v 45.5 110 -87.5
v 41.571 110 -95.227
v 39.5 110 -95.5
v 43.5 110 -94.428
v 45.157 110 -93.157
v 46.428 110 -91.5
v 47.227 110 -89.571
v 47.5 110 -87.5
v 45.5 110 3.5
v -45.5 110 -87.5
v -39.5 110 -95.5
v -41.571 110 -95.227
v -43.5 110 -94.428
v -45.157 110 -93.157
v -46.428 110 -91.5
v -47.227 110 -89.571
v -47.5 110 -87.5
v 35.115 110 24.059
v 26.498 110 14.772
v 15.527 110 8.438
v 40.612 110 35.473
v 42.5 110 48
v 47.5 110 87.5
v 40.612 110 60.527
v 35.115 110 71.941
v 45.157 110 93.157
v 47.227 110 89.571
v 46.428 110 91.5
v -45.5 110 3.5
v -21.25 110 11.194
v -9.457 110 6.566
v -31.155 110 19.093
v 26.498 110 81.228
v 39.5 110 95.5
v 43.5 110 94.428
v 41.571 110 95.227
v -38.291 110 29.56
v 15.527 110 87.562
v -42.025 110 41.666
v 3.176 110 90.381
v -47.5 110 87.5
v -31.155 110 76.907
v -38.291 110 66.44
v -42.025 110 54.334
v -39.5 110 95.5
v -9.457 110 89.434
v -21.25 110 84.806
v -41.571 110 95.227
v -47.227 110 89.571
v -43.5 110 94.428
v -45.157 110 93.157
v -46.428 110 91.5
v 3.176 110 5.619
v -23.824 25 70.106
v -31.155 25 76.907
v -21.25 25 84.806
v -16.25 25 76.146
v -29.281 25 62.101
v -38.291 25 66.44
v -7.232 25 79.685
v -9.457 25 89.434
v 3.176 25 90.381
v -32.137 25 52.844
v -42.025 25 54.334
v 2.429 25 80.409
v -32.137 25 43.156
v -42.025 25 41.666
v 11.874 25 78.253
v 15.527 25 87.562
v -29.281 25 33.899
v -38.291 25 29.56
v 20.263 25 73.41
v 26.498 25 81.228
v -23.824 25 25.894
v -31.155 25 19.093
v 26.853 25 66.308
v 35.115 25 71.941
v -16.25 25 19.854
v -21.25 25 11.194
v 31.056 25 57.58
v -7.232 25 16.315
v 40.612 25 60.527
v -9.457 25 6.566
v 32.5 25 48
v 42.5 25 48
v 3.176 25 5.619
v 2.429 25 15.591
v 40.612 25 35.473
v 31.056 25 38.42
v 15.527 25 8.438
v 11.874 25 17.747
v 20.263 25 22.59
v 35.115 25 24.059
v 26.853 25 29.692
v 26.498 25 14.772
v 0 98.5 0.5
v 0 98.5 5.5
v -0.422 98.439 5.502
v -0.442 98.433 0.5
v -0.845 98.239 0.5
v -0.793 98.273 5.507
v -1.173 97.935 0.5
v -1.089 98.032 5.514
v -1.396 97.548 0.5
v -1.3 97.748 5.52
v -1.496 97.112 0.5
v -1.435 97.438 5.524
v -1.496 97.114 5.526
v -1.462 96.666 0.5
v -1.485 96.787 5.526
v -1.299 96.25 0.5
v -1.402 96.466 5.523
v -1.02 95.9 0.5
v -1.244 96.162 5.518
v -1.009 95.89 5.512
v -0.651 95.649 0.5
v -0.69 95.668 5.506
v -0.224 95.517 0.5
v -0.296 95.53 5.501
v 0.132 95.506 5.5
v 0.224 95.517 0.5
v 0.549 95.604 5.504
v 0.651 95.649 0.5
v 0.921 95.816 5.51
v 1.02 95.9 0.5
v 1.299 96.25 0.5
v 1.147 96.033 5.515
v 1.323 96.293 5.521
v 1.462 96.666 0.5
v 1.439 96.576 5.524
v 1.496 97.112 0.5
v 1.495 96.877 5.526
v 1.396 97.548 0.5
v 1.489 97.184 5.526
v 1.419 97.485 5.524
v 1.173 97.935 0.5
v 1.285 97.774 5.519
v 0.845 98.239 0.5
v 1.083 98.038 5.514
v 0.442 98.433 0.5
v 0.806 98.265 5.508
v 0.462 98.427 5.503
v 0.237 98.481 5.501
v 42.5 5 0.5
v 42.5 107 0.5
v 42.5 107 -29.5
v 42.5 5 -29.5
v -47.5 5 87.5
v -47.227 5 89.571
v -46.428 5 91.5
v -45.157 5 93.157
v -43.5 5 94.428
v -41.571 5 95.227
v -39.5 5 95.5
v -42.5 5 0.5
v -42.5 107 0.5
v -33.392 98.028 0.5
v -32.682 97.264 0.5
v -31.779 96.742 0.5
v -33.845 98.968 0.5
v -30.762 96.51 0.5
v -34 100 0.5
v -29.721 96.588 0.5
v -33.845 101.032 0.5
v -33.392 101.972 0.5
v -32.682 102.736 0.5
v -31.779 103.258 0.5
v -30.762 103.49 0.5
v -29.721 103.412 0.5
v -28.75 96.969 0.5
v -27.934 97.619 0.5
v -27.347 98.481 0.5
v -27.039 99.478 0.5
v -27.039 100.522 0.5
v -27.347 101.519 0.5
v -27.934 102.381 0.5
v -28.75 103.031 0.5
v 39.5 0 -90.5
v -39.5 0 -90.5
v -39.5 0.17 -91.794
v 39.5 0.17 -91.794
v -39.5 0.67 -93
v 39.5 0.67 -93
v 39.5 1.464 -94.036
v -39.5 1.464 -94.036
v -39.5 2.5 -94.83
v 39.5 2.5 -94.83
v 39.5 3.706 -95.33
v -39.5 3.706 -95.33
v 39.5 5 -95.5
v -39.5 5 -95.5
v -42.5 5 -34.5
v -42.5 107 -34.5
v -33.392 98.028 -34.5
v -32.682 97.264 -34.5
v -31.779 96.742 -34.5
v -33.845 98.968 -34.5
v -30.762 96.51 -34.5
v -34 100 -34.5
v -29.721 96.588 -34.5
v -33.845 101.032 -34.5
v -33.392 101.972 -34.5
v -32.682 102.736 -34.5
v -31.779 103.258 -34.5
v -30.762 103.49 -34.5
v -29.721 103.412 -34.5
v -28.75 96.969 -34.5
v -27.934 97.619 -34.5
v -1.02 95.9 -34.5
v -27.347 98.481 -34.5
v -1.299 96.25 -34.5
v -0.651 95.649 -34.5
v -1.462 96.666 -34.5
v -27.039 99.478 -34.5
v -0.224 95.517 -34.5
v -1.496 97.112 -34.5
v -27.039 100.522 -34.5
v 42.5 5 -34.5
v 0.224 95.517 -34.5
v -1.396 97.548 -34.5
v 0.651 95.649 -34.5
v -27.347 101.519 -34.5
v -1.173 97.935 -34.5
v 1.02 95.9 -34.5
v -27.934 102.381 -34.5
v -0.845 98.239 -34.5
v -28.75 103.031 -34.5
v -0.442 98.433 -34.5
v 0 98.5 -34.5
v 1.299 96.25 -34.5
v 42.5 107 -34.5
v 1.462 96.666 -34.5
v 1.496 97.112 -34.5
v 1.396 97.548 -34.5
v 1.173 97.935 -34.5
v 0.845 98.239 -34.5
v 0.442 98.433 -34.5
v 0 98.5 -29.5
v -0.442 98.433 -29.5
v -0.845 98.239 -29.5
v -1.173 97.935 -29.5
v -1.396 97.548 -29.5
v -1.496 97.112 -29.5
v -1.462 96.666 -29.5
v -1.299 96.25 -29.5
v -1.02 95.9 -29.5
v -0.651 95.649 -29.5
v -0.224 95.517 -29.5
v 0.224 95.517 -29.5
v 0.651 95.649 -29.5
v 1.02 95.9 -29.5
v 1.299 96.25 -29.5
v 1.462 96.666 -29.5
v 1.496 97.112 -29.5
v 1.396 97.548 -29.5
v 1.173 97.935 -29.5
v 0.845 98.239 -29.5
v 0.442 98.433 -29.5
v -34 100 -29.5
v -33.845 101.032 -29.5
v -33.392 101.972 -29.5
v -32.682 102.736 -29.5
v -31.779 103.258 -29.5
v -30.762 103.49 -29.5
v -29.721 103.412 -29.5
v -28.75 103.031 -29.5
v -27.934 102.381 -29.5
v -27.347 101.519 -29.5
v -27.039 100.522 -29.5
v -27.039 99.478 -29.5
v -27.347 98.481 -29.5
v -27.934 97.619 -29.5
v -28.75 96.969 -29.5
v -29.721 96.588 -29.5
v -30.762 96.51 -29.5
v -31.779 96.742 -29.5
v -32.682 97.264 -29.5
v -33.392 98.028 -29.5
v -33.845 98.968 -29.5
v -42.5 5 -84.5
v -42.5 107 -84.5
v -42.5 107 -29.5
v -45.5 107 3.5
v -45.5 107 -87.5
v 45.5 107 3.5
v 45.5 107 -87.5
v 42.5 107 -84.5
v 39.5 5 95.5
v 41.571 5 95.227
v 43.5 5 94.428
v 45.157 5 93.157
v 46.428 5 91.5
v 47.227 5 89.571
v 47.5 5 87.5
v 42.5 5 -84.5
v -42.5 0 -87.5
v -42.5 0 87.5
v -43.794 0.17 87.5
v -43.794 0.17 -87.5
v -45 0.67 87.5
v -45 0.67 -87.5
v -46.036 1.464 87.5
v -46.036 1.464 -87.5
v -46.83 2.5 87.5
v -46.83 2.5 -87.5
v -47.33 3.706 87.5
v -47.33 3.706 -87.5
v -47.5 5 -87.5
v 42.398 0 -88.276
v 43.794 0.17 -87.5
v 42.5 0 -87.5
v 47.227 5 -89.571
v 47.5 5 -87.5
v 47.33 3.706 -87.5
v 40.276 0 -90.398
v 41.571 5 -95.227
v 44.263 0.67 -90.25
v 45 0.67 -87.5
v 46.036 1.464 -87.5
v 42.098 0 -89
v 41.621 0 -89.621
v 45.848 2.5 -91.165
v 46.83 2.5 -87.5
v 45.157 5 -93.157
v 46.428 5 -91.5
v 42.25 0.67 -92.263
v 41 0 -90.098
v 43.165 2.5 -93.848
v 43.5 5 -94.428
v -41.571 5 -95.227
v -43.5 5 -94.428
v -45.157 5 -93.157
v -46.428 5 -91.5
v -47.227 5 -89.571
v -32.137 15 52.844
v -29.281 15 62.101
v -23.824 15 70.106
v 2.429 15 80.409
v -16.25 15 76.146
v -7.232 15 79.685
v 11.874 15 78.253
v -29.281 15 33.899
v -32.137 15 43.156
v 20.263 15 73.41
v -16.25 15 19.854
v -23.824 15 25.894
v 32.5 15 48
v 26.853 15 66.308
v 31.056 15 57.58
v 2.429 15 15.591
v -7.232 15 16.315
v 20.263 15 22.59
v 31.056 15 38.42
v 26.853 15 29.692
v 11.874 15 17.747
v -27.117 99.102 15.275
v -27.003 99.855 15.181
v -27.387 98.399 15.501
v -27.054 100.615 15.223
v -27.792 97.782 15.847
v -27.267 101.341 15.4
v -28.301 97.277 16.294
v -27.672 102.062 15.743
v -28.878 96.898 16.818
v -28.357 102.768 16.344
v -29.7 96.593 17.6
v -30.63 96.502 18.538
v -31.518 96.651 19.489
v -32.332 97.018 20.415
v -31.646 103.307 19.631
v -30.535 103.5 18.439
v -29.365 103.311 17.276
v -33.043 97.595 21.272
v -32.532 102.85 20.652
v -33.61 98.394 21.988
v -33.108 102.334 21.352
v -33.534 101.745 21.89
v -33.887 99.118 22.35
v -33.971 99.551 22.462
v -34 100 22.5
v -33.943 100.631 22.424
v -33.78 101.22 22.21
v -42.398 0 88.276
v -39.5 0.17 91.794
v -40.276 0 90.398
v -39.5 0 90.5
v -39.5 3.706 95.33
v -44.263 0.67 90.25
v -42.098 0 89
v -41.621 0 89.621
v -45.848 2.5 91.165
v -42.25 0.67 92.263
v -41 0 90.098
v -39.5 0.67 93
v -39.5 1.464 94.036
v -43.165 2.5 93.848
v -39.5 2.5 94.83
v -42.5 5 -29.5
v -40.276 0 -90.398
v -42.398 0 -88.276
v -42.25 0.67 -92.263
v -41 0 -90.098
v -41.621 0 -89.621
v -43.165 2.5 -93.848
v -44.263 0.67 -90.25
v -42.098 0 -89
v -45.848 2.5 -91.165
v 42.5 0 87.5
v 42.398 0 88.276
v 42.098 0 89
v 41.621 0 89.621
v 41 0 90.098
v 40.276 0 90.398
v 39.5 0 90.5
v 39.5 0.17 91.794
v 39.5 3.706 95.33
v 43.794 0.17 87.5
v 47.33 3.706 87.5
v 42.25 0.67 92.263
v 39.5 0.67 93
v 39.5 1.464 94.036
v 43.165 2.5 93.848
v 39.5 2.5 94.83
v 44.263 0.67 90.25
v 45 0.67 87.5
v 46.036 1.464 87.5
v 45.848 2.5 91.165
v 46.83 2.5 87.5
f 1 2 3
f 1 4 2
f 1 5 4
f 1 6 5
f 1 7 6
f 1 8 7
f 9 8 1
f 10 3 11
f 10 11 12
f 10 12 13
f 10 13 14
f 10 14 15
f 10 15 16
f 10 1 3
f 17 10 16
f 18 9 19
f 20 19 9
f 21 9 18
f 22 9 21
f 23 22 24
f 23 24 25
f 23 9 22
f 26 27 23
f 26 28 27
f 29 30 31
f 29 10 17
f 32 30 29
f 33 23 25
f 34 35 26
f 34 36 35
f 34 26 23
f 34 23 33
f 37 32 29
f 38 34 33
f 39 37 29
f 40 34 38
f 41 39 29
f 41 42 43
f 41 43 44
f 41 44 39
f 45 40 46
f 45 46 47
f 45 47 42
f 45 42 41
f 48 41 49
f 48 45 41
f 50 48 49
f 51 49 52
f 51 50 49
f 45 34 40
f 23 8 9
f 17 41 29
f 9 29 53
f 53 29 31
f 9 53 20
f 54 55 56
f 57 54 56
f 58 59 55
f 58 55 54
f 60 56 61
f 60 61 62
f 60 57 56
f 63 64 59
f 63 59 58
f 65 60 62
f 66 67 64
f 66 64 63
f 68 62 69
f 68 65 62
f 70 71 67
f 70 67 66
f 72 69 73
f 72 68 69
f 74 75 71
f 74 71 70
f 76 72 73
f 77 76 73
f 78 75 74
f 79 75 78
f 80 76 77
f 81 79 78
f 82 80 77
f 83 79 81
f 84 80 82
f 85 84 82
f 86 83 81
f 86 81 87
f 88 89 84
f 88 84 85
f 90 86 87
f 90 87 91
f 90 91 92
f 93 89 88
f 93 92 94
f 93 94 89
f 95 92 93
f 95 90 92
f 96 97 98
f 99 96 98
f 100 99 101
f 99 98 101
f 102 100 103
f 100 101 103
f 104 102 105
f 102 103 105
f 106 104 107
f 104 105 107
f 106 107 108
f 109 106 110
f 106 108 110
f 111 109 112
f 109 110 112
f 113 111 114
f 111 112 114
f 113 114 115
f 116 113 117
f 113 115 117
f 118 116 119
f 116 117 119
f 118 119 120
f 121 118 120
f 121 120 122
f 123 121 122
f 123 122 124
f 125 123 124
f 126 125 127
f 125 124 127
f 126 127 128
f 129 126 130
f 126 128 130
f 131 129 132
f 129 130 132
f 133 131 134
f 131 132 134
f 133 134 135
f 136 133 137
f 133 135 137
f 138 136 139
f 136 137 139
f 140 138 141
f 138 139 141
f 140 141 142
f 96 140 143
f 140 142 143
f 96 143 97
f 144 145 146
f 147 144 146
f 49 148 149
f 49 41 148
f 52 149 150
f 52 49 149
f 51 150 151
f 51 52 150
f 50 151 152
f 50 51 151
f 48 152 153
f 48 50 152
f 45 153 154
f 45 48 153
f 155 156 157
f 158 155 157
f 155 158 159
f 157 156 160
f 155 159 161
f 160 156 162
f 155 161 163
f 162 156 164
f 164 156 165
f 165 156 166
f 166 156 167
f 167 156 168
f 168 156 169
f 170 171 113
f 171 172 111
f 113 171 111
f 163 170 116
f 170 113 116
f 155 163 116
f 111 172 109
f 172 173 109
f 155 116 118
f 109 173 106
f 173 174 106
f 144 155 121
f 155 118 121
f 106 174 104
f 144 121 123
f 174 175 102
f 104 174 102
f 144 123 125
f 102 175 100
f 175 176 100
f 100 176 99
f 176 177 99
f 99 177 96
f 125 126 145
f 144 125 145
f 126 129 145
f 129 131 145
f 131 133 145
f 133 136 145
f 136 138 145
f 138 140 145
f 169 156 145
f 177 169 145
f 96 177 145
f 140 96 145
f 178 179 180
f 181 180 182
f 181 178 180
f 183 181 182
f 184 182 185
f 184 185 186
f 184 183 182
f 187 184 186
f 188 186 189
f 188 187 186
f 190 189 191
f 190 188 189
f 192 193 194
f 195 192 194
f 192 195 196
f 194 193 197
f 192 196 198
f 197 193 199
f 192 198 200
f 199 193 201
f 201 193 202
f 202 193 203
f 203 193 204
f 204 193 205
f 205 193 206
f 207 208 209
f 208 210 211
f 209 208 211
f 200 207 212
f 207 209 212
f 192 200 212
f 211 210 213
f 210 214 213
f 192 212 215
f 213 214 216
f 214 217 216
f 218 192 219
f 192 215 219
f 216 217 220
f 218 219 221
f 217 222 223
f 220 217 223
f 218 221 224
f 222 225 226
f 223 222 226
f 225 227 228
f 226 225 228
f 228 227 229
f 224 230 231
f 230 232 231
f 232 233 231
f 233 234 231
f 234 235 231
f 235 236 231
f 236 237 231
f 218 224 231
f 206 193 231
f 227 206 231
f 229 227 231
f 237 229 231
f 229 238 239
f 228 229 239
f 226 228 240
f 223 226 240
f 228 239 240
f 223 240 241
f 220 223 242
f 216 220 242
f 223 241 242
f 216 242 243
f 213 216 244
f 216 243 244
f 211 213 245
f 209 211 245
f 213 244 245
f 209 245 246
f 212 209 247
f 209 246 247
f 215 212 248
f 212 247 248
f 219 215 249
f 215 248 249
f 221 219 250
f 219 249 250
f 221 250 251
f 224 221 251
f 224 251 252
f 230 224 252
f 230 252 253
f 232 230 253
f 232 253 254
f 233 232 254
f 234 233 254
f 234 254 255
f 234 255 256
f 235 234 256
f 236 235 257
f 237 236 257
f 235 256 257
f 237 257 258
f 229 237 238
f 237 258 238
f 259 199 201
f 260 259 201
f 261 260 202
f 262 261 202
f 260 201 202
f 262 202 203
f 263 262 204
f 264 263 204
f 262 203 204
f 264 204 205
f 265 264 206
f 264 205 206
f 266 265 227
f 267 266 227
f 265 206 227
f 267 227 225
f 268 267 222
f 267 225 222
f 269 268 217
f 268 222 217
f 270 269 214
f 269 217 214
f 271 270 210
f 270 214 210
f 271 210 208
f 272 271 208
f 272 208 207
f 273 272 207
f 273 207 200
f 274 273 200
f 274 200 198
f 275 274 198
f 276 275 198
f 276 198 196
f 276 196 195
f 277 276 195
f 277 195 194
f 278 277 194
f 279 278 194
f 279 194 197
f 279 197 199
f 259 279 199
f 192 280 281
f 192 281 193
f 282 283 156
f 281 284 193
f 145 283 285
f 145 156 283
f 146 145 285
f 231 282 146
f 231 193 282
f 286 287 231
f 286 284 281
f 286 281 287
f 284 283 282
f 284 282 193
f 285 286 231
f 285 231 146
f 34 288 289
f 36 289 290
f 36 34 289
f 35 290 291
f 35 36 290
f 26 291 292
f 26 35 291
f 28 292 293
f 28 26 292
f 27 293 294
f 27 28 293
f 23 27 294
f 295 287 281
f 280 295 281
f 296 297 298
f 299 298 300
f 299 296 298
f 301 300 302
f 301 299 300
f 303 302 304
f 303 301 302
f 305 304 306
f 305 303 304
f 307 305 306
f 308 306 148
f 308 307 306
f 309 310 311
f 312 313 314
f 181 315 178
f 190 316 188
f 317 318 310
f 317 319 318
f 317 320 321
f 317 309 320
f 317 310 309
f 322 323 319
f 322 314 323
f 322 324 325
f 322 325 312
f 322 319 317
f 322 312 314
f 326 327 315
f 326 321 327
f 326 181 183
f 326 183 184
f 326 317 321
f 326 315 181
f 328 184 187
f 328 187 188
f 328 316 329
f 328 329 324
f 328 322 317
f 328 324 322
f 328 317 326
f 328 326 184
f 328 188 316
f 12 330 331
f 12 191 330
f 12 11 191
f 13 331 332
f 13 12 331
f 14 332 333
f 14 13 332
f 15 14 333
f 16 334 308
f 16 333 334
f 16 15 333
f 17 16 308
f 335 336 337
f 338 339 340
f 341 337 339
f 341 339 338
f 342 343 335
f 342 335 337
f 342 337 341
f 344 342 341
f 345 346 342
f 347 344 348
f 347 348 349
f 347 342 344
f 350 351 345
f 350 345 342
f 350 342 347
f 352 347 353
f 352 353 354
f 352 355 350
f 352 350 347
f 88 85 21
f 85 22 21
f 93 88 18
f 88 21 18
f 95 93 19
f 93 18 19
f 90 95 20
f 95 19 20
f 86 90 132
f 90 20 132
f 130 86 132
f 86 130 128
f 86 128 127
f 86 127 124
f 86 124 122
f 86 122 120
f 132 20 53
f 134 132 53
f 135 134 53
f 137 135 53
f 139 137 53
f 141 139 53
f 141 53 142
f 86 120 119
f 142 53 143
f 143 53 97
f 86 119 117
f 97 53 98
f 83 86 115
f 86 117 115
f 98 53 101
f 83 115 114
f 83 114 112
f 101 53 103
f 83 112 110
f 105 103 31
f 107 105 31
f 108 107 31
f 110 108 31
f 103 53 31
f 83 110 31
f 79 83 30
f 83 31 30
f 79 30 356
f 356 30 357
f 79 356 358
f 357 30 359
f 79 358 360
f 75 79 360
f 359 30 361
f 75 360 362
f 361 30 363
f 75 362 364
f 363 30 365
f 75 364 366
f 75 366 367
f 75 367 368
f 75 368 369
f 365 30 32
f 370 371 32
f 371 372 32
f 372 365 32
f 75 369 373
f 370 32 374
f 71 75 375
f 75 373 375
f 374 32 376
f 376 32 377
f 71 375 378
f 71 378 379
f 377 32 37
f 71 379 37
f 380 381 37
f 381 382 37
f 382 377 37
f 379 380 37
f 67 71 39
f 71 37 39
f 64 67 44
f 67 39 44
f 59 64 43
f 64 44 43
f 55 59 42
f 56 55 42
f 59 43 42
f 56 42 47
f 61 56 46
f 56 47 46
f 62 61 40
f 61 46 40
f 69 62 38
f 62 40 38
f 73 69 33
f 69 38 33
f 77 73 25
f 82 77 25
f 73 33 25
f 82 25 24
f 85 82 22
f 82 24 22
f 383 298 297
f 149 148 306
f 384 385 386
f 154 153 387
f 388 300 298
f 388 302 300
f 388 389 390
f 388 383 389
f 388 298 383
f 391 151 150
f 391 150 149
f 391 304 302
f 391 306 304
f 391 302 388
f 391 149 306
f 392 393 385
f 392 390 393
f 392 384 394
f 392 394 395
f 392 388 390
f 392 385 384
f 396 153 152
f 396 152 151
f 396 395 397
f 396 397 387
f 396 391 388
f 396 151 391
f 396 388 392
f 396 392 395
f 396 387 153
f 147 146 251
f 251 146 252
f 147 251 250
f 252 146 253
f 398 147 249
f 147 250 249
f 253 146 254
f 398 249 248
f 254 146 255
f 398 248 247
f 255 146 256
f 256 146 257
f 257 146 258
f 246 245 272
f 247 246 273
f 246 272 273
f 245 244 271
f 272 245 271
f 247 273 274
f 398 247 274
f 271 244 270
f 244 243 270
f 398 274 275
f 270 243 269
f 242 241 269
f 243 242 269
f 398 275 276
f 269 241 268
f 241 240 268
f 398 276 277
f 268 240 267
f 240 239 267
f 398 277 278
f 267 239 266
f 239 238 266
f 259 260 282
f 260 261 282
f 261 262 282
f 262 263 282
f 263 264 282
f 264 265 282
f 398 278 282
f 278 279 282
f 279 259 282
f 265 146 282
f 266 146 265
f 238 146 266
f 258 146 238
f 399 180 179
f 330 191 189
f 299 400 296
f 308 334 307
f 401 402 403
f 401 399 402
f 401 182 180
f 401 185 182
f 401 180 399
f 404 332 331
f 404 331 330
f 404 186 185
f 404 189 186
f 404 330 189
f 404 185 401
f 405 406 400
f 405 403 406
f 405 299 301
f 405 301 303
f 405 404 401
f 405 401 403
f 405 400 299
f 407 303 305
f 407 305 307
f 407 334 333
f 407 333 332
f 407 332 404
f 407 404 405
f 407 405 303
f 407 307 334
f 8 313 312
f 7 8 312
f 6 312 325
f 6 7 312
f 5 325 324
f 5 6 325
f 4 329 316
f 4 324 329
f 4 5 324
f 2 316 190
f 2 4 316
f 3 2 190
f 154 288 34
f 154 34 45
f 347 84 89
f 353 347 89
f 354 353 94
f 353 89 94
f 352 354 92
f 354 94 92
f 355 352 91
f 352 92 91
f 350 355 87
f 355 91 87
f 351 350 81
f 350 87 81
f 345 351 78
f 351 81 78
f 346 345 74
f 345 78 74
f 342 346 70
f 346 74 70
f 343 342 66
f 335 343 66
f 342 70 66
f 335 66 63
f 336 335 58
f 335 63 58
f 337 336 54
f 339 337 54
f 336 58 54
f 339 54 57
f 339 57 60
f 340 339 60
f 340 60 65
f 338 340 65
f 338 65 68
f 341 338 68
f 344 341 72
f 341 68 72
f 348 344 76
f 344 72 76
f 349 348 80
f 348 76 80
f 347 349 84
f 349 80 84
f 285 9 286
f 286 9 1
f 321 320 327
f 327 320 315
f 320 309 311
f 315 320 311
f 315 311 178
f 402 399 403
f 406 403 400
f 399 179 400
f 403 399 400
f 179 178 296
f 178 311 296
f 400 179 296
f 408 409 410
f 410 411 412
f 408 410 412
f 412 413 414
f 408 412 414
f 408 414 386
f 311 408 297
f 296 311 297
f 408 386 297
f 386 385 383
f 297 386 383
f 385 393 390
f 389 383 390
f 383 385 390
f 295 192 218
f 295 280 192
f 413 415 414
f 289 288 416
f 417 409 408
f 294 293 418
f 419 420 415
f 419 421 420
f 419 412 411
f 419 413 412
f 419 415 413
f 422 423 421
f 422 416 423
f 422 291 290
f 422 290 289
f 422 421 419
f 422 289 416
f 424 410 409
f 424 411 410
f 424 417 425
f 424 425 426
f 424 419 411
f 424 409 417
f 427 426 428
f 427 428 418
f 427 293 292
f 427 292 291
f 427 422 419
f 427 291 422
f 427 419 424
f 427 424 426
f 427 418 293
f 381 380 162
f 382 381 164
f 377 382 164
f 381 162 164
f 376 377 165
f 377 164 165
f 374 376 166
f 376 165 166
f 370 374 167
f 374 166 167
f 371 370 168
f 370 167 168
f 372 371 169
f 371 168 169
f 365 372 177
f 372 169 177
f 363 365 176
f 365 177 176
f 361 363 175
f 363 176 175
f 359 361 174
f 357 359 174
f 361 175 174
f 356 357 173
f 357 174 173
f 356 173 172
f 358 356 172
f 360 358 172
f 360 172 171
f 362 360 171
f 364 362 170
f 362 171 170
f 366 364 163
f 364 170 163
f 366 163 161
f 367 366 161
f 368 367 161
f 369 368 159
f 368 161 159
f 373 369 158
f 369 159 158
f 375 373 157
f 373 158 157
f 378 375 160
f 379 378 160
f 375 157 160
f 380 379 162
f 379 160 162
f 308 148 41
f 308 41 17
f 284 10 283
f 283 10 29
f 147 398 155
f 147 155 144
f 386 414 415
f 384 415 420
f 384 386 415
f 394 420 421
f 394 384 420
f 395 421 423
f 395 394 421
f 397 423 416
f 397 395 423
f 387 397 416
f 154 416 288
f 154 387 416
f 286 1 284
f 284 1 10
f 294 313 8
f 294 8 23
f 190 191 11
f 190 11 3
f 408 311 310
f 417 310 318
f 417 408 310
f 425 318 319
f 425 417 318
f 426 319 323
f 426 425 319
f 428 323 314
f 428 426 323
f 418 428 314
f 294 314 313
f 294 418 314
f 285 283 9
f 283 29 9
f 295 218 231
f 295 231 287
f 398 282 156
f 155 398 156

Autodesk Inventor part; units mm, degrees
ref_plane "YZ Plane" through (0, 0, 0) normal (1, 0, 0) x (0, 1, 0)
ref_plane "XZ Plane" through (0, 0, 0) normal (0, 1, 0) x (-1, 0, 0)
ref_plane "XY Plane" through (0, 0, 0) normal (0, 0, 1) x (1, 0, 0)
sketch "Náčrt1" plane through (0, 0, 0) normal (0, 1, 0) x (-1, 0, 0)
  line L0 (0, -133.7) -> (0, 133.7) projected
  line L1 (-66.5, 0) -> (66.5, 0) projected
  line L2 (-47.5, 95.5) -> (47.5, 95.5)
  line L3 (47.5, 95.5) -> (47.5, -95.5)
  line L4 (47.5, -95.5) -> (-47.5, -95.5)
  line L5 (-47.5, -95.5) -> (-47.5, 95.5)
  line L6 (-47.5, 95.5) -> (47.5, -95.5) construction
  line L7 (47.5, 95.5) -> (-47.5, -95.5) construction
  point P0 (0, 0)
  dimension "d0" = 191
  dimension "d1" = 95
extrude "Vysunutí1" add sketch "Náčrt1" along normal blind 110
sketch "Náčrt2" plane through (0, 110, 0) normal (0, 1, 0) x (1, 0, 0)
  line L0 (0, 133.7) -> (0, -133.7) projected
  line L1 (66.5, 0) -> (-66.5, 0) projected
  circle A0 centre (0, -48) radius 42.5
  line L2 (-47.5, -95.5) -> (47.5, -95.5) projected
  point P0 (0, 0)
  dimension "d4" = 85
  dimension "d5" = 47.5
extrude "Vysunutí2" cut sketch "Náčrt2" against normal blind 85
sketch "Náčrt3" plane through (0, 110, 0) normal (0, 1, 0) x (1, 0, 0)
  line L0 (66.5, 0) -> (-66.5, 0) projected
  line L1 (0, 133.7) -> (0, -133.7) projected
  circle A0 centre (0, -48) radius 42.5 projected
  line L2 (-42.5, -0.5) -> (42.5, -0.5)
  line L3 (42.5, -0.5) -> (42.5, 29.5)
  line L4 (42.5, 29.5) -> (-42.5, 29.5)
  line L5 (-42.5, 29.5) -> (-42.5, -0.5)
  point P0 (0, 0)
  dimension "d8" = 30
  dimension "d9" = 85
  dimension "d10" = 47.5
extrude "Vysunutí3" cut sketch "Náčrt3" against normal blind 105 contours L3 L2 L1 L0 | L0 L1 L4 L3 | L1 L2 L5 L0 | L0 L5 L4 L1
sketch "Náčrt4" plane through (0, 110, 0) normal (0, 1, 0) x (1, 0, 0)
  line L0 (0, 133.7) -> (0, -133.7) projected
  line L1 (66.5, 0) -> (-66.5, 0) projected
  line L2 (-42.5, 34.5) -> (42.5, 34.5)
  line L3 (42.5, 34.5) -> (42.5, 84.5)
  line L4 (42.5, 84.5) -> (-42.5, 84.5)
  line L5 (-42.5, 84.5) -> (-42.5, 34.5)
  line L6 (-42.5, 29.5) -> (42.5, 29.5) projected
  point P0 (0, 0)
  dimension "d13" = 5
  dimension "d14" = 50
  dimension "d15" = 85
extrude "Vysunutí4" cut sketch "Náčrt4" against normal blind 105
sketch "Náčrt6" plane through (0, 25, 48) normal (0, 1, 0) x (1, 0, 0)
  circle A0 centre (0, 0) radius 42.5 projected
  line L0 (66.5, 48) -> (-66.5, 48) projected
  line L1 (0, 181.7) -> (0, -85.7) projected
  circle A1 centre (0, 0) radius 32.5
  point P0 (0, 48)
  dimension "d24" = 65
extrude "Vysunutí6" cut sketch "Náčrt6" against normal blind 10 contours A1 L1 | L1 A1
fillet "Zaoblení1" radius 8 4 edges at (47.5, 55, -95.5) (-47.5, 55, -95.5) (47.5, 55, 95.5) (-47.5, 55, 95.5)
fillet "Zaoblení2" radius 5 8 edges at (45.1569, 0, -93.1569) (0, 0, -95.5) (-45.1569, 0, -93.1569) (-47.5, 0, 0) (-45.1569, 0, 93.1569) (0, 0, 95.5) (45.1569, 0, 93.1569) (47.5, 0, 0)
sketch "Náčrt7" plane through (0, 110, 0) normal (0, 1, 0) x (1, 0, 0)
  line L0 (0, 133.7) -> (0, -133.7) projected
  line L1 (66.5, 0) -> (-66.5, 0) projected
  circle A0 centre (0, -48) radius 42.5 projected
  line L2 (-45.5, -3.5) -> (45.5, -3.5)
  line L3 (45.5, -3.5) -> (45.5, 87.5)
  line L4 (45.5, 87.5) -> (-45.5, 87.5)
  line L5 (-45.5, 87.5) -> (-45.5, -3.5)
  point P0 (0, 0)
  dimension "d29" = 91
  dimension "d30" = 44.5
  dimension "d31" = 91
extrude "Vysunutí7" cut sketch "Náčrt7" against normal blind 3 contours L4 L3 L1 L0 | L0 L1 L5 L4 | L1 L3 L2 L0 | L0 L2 L5 L1
sketch "Náčrt8" plane through (42.5, 5, -34.5) normal (0, 0, -1) x (-1, 0, 0)
  line L0 (85, 102) -> (0, 102) projected
  line L1 (85, 102) -> (85, 0) projected
  circle A0 centre (73, 95) radius 3.5
  point P0 (42.5, -5)
  dimension "d34" = 7
  dimension "d35" = 12
  dimension "d36" = 3.5
extrude "Vysunutí8" cut sketch "Náčrt8" against normal blind 70
sketch "Náčrt9" plane through (42.5, 5, -34.5) normal (0, 0, -1) x (-1, 0, 0)
  line L0 (85, 102) -> (0, 102) projected
  line L1 (0, 102) -> (0, 0) projected
  line L2 (85, 102) -> (85, 0) projected
  point P0 (42.5, -5)
  point P1 (42.5, 92)
  dimension "d39" = 42.5
  dimension "d40" = 10
hole "Díra1" at (0, 97, -34.5) direction (0, 0, 1) diameter 3 depth 8 tip angle 118
sketch "Náčrt10" plane through (42.5, 5, 0.5) normal (0, 0, -1) x (-1, 0, 0)
  line L0 (85, 102) -> (0, 102) projected
  line L1 (0, 102) -> (0, 0) projected
  line L2 (85, 102) -> (85, 0) projected
  circle A0 centre (42.5, 92) radius 1.5 projected
  point P0 (42.5, -5)
hole "Díra2" at (0, 97, 0.5) direction (0, 0, 1) diameter 3 depth 8 tip angle 118
properties part number "květináč"
